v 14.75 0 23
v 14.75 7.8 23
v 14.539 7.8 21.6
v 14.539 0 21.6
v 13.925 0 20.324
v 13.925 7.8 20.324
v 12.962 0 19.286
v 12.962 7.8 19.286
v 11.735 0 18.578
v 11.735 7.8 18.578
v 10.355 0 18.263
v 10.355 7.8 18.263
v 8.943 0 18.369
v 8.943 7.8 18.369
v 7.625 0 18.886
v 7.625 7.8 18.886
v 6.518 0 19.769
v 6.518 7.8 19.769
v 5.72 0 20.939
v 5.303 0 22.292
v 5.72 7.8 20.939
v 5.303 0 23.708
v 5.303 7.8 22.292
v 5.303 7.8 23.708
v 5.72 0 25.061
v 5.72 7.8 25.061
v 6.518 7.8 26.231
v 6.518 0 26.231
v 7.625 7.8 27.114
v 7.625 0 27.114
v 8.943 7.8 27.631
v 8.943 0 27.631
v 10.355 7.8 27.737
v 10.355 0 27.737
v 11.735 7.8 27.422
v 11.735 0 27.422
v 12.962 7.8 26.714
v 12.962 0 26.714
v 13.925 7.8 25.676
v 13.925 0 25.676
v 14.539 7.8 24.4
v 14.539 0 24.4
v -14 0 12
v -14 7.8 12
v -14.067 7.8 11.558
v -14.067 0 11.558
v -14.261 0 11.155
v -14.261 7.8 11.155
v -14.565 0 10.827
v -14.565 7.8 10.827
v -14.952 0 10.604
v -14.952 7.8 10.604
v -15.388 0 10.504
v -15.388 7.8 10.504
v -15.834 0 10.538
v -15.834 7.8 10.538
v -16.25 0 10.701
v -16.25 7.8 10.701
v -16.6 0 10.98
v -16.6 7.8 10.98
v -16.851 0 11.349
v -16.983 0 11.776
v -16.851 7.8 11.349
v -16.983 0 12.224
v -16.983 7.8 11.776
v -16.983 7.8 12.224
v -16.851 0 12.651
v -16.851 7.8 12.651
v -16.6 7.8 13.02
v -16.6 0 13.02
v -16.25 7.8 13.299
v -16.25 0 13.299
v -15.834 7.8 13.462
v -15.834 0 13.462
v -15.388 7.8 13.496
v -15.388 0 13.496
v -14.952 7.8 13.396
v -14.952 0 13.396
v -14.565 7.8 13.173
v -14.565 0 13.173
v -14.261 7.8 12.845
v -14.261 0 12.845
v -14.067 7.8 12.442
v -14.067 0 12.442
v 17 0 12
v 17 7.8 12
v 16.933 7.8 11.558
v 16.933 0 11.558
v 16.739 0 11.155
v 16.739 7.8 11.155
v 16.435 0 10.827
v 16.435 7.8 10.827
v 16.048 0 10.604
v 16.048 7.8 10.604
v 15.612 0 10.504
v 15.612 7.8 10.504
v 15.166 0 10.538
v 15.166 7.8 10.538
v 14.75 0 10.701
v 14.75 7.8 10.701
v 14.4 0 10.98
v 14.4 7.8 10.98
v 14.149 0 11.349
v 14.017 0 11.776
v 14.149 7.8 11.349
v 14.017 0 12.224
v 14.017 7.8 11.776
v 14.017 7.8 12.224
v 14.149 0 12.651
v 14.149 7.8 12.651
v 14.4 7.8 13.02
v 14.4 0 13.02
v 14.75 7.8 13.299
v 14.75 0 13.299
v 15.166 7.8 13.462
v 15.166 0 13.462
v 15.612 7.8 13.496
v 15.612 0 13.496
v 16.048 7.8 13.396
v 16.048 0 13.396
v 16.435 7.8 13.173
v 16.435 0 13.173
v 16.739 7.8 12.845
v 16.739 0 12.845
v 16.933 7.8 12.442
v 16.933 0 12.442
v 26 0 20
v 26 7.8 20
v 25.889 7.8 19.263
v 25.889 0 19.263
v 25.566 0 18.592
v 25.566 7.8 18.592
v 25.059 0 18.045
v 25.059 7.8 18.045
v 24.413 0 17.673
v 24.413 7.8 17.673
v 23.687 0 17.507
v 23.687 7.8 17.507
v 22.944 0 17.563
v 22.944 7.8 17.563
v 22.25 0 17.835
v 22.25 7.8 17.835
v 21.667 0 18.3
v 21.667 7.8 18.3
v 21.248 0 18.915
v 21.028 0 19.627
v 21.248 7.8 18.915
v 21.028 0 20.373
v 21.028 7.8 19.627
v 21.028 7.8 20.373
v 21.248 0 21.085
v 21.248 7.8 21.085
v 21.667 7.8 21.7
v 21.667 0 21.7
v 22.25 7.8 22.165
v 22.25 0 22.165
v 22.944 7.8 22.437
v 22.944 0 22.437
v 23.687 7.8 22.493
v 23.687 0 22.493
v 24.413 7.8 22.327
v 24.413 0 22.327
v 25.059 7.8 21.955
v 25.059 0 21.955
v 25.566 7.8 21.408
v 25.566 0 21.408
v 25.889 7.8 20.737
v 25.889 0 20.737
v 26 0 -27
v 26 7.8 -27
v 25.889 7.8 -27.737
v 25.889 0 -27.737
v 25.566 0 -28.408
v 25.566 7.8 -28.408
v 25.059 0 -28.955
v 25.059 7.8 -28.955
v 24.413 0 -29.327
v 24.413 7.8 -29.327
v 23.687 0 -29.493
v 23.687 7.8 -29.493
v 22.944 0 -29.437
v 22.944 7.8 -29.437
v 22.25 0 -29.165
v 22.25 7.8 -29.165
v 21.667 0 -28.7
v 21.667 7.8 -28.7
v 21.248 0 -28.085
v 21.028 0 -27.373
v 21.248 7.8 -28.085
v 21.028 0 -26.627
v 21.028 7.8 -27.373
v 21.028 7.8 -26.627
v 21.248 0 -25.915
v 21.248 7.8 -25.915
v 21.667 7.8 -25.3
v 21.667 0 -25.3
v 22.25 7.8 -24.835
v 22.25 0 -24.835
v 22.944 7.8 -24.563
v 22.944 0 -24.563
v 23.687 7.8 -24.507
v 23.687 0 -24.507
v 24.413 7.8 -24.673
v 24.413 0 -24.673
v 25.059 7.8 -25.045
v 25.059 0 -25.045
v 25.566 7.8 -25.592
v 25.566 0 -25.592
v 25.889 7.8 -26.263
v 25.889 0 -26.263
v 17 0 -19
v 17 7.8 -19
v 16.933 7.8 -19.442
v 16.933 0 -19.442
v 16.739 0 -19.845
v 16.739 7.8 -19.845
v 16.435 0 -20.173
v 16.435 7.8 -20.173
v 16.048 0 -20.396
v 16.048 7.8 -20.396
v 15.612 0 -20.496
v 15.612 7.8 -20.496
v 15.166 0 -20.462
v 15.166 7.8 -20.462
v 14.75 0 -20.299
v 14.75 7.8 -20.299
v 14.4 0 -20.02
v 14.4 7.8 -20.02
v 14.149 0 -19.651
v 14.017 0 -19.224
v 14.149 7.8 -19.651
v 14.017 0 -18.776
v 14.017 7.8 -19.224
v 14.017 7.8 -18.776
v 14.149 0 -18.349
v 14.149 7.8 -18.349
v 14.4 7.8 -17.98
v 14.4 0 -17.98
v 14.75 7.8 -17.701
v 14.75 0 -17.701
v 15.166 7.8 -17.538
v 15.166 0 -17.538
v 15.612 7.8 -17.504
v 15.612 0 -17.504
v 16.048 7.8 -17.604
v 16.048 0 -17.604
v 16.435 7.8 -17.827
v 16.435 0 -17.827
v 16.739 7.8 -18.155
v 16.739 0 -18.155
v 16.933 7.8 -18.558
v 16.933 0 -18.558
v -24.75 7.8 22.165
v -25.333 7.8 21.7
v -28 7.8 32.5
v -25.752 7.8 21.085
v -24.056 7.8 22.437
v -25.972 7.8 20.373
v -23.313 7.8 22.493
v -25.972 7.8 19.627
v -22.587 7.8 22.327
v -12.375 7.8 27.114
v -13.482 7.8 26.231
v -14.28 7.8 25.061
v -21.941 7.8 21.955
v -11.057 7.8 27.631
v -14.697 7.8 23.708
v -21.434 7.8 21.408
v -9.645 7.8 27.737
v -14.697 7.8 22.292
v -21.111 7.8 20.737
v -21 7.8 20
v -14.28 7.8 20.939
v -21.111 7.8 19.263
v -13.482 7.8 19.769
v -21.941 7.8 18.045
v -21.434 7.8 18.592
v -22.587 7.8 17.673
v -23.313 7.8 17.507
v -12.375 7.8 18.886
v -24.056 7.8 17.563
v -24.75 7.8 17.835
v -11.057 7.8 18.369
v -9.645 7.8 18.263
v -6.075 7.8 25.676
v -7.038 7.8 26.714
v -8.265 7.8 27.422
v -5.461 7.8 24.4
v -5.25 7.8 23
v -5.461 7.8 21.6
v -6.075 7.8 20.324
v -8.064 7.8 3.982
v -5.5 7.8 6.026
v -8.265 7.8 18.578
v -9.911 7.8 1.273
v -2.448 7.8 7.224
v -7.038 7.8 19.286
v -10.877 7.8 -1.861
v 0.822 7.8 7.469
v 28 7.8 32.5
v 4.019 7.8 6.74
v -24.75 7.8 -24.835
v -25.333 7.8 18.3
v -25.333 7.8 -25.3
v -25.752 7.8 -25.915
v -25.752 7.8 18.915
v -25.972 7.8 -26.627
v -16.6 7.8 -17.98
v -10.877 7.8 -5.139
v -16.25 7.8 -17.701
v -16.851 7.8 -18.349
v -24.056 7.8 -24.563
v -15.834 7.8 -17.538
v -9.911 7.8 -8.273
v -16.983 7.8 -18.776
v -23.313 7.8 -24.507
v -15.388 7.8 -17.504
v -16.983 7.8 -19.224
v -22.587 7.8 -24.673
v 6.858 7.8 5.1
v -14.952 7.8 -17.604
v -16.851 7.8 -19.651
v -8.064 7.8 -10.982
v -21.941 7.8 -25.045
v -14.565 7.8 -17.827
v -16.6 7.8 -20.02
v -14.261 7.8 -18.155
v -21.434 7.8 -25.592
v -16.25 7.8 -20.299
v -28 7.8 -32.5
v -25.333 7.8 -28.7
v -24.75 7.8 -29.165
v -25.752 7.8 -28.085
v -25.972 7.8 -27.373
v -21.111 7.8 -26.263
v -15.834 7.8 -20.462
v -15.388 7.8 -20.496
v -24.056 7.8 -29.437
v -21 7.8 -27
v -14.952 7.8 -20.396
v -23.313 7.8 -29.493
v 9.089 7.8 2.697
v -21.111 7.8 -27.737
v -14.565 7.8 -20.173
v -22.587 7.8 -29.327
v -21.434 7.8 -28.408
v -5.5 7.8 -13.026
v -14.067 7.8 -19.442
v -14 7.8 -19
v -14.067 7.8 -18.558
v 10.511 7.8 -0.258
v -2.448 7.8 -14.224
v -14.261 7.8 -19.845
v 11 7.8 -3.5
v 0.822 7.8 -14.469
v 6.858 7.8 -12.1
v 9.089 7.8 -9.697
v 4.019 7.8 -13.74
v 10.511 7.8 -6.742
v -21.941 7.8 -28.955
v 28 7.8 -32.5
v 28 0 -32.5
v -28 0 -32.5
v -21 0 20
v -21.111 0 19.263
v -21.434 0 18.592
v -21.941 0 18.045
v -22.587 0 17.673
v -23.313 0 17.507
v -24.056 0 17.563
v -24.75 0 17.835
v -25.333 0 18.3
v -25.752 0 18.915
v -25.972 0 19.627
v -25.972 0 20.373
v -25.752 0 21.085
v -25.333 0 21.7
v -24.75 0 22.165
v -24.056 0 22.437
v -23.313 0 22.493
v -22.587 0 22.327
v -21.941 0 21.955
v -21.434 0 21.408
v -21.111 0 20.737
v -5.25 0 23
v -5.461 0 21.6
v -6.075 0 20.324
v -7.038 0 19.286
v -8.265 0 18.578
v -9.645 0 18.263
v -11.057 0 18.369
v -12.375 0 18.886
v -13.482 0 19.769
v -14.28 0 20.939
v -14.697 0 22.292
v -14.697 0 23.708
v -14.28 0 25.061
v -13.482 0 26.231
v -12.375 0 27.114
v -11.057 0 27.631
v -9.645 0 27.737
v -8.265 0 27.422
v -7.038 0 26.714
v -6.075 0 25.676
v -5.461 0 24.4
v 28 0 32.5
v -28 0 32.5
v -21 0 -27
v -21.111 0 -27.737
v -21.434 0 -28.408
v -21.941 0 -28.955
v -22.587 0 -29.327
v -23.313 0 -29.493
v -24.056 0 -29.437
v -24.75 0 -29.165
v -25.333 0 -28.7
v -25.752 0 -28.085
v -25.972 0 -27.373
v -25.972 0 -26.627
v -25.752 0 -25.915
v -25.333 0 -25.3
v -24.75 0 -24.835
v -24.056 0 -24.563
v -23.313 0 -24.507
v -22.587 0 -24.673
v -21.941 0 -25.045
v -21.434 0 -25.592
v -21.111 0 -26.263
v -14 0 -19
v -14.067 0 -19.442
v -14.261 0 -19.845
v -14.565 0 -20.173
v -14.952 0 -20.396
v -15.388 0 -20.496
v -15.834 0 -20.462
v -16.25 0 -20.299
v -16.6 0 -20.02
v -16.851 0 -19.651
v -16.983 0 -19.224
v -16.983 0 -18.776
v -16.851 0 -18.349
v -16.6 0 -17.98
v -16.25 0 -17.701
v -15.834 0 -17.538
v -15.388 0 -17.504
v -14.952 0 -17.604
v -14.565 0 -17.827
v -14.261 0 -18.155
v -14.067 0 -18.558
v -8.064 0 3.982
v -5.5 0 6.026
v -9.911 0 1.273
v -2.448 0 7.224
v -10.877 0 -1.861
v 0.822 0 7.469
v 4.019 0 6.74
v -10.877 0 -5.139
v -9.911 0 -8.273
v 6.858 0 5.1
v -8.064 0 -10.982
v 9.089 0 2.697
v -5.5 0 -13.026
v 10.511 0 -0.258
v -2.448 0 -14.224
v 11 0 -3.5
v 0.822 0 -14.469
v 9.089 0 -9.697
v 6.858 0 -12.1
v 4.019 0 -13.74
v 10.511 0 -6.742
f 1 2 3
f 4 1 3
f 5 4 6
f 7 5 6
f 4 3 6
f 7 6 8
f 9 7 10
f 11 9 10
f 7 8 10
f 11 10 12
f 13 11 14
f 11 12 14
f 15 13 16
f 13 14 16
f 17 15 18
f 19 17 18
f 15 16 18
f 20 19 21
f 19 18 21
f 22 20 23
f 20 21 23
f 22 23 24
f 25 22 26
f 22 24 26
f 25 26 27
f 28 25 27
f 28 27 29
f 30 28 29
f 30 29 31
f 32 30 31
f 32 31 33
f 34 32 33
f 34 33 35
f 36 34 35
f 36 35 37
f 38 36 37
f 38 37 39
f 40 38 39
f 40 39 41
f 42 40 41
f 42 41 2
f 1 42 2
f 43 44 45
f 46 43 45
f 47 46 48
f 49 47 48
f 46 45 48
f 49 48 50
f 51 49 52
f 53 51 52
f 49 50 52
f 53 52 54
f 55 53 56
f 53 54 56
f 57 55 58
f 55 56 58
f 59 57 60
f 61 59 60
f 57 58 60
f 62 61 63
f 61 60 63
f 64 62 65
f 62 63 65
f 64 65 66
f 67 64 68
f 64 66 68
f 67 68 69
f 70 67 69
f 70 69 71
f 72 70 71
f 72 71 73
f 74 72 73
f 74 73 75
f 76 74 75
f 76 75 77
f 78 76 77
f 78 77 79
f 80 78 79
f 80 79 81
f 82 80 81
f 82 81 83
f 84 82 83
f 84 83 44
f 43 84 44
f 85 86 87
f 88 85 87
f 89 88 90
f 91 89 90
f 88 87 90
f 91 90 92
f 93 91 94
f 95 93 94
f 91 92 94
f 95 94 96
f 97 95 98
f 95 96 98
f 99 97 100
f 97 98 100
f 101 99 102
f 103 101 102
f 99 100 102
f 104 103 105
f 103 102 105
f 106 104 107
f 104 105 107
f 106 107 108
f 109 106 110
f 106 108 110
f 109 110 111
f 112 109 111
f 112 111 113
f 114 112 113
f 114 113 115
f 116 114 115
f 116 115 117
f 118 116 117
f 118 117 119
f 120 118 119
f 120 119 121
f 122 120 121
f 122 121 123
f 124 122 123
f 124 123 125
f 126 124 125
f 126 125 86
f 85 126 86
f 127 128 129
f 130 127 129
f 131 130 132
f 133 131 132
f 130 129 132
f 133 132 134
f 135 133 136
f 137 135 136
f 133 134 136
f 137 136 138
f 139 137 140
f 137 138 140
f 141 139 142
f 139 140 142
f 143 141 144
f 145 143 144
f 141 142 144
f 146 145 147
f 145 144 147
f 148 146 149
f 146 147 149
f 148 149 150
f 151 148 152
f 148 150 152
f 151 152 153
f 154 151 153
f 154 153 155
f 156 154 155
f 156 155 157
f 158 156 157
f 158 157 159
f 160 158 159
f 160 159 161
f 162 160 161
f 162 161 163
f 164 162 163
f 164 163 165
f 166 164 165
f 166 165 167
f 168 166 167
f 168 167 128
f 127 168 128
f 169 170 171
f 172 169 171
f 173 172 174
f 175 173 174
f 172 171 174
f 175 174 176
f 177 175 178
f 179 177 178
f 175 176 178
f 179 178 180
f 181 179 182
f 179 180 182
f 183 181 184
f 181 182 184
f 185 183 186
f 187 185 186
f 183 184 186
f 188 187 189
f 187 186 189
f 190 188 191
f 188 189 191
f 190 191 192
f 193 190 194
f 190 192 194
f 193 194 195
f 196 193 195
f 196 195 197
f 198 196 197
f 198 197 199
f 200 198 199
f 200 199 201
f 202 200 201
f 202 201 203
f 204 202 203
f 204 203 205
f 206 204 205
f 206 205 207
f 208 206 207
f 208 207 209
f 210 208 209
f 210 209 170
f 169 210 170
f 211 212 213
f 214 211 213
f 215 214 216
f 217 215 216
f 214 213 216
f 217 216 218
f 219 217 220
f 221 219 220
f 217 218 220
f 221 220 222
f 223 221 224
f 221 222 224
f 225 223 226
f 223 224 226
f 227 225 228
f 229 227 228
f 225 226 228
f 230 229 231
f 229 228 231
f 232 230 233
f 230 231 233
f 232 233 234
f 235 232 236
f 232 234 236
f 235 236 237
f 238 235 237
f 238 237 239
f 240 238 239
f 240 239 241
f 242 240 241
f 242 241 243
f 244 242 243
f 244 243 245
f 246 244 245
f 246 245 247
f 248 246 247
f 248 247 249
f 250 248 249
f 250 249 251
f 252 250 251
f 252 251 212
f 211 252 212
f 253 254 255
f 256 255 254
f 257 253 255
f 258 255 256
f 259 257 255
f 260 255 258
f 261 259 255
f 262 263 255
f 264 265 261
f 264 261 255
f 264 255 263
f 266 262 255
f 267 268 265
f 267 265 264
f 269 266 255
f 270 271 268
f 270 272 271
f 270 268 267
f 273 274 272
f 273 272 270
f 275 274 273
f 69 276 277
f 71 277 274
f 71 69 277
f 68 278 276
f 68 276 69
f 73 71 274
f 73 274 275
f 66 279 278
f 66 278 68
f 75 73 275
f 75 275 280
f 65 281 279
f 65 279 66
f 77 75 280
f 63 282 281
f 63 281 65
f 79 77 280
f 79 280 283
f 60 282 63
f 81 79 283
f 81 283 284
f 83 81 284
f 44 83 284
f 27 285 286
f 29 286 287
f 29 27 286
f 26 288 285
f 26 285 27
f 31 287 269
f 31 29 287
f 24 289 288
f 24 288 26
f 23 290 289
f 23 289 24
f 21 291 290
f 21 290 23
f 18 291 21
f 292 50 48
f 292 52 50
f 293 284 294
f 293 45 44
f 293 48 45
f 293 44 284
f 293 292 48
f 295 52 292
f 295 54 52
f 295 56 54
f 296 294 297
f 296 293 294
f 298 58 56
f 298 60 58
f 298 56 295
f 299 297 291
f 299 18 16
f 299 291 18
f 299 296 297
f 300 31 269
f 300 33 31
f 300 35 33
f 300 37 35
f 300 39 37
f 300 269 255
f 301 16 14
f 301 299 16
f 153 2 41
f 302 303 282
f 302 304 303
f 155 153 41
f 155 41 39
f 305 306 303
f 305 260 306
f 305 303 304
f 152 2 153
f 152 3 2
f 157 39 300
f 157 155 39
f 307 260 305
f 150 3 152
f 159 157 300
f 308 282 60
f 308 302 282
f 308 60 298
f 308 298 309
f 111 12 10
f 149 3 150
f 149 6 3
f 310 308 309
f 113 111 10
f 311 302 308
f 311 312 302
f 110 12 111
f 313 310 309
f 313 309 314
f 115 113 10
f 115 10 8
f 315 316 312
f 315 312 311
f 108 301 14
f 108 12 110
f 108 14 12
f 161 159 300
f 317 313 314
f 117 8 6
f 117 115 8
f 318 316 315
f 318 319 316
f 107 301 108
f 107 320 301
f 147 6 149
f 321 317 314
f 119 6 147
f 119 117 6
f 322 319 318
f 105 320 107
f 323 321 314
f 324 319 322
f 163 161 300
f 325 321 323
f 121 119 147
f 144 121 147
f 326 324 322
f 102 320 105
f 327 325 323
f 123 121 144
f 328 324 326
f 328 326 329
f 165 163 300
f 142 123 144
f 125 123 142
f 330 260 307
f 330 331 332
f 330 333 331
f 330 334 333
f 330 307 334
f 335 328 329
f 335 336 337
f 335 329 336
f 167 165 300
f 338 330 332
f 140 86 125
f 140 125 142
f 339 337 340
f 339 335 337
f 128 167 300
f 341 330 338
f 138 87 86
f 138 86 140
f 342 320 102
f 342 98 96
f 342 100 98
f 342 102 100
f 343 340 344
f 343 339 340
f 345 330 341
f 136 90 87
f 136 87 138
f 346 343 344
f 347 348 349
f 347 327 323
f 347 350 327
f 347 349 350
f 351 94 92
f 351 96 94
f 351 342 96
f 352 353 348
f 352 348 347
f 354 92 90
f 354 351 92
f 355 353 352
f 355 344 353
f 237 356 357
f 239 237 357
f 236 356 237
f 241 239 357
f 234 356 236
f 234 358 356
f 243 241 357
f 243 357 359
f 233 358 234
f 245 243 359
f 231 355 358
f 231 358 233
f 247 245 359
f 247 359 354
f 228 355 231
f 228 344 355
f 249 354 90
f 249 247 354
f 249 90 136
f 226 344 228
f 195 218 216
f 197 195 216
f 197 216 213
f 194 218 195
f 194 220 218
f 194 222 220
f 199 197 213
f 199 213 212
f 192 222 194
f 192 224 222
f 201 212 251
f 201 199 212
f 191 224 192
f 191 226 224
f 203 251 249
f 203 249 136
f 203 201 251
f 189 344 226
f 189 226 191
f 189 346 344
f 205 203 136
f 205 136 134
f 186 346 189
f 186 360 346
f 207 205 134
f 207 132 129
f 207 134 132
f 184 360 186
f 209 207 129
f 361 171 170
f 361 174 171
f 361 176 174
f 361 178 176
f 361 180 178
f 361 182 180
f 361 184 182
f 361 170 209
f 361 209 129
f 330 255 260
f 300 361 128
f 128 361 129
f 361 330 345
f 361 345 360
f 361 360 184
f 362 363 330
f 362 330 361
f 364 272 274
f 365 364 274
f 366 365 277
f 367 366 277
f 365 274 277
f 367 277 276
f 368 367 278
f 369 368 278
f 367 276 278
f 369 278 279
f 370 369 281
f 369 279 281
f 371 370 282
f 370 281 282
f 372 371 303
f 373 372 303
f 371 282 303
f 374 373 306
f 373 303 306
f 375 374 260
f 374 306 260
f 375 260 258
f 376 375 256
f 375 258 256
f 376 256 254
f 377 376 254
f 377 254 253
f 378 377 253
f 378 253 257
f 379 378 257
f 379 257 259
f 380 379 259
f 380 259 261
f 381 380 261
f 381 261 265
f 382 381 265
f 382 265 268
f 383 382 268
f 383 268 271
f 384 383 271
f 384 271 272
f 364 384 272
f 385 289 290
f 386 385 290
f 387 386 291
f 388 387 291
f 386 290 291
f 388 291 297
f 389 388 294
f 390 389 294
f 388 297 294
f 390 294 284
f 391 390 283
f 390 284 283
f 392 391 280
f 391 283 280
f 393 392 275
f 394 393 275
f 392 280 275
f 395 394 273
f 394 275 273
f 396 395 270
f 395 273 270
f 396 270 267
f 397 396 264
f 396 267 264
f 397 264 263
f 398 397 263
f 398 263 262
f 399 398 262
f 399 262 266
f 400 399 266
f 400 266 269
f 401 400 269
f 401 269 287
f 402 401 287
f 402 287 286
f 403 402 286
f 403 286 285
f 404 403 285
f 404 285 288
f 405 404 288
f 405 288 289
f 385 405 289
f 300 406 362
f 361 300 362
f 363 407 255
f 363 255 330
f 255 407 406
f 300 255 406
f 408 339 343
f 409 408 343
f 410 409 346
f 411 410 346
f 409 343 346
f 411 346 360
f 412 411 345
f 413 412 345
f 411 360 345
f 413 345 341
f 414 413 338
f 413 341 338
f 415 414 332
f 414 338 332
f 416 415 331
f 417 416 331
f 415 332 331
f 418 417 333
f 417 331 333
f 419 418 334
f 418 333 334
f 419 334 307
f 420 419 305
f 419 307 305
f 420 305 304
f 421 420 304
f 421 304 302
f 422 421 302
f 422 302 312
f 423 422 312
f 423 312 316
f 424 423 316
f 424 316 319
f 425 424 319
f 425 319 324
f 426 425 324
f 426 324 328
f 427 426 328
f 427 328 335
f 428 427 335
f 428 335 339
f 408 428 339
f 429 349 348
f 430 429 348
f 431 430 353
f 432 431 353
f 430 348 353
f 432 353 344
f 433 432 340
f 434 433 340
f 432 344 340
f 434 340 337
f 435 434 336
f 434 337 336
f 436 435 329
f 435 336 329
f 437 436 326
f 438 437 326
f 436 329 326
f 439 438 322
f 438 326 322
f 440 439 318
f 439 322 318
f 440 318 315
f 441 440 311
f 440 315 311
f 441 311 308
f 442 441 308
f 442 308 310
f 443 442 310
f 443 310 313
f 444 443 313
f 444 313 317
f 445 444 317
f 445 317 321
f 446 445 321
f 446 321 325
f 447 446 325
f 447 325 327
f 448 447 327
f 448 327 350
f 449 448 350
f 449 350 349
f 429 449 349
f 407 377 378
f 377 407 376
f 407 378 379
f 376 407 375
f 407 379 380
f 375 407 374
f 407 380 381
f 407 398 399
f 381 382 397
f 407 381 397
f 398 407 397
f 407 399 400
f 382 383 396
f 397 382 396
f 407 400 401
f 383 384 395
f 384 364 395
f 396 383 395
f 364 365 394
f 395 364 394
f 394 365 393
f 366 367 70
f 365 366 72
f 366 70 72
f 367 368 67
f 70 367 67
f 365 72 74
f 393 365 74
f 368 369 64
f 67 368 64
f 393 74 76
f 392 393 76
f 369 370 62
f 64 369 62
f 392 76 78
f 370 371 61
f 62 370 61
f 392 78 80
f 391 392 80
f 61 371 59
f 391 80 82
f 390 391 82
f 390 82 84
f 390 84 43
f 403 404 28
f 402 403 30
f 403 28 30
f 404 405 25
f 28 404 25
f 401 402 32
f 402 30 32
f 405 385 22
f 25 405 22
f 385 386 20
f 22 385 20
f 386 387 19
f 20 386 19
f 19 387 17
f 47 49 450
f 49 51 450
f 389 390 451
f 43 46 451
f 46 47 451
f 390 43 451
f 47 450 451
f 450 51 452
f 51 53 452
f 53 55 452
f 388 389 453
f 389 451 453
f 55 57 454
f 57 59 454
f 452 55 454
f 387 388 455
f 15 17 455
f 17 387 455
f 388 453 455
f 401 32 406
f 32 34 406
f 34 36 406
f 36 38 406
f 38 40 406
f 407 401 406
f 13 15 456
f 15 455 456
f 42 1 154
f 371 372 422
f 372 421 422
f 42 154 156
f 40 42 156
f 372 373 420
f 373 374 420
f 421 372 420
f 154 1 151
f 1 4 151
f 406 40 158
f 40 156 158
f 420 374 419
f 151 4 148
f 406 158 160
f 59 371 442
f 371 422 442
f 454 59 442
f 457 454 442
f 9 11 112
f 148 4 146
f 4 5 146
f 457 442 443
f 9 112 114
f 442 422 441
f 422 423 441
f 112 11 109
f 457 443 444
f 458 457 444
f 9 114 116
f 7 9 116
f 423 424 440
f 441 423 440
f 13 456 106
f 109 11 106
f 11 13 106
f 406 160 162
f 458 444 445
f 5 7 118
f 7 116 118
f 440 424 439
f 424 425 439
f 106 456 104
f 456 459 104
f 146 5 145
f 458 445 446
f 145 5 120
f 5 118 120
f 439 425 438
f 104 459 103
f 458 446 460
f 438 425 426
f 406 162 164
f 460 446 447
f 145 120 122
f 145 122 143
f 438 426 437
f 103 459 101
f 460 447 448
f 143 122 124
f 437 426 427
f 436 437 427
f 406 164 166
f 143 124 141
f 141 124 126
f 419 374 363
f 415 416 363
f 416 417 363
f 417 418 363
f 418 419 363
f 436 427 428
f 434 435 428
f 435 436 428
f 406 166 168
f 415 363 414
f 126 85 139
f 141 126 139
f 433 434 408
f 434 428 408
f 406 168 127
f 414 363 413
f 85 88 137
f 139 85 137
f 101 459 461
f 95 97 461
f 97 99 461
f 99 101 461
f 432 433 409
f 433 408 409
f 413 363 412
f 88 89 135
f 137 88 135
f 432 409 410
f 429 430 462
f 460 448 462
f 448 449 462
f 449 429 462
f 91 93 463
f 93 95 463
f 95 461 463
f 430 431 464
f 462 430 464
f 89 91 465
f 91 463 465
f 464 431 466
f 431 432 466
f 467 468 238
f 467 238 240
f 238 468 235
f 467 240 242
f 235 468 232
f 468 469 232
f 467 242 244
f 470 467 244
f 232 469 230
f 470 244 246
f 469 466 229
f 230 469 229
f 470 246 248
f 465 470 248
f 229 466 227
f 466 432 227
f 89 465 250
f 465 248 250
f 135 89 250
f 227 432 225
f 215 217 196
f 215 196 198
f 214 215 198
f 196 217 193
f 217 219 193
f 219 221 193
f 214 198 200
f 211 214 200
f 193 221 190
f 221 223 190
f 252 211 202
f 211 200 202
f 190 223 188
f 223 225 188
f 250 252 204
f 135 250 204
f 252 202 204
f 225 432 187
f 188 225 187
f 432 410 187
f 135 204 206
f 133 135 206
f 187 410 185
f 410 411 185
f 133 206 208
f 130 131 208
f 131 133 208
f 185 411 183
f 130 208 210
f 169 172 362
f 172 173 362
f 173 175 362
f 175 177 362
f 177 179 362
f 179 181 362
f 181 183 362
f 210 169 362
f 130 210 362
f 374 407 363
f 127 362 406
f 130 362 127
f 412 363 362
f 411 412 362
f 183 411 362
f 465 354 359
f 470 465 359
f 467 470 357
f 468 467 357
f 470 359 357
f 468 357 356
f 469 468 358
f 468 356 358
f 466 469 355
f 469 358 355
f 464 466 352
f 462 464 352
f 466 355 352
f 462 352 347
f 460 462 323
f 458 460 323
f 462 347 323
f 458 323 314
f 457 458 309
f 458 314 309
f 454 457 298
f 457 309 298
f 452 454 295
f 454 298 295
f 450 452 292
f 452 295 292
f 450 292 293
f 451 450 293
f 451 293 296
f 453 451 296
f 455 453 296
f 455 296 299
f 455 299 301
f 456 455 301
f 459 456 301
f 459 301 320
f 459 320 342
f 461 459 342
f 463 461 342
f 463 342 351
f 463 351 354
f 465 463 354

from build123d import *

# Parameters (mm, degrees)
SKETCH_1_W          = 56
SKETCH_1_H          = 65
EXTRUDE_1_DEPTH     = 7.8
SKETCH_3_R          = 4.75
CUT_EXTRUDE_2_DEPTH = 8.8
SKETCH_4_R          = 11
SKETCH_4_R_2        = 1.5
SKETCH_4_R_3        = 2.5
CUT_EXTRUDE_3_DEPTH = 8.8


with BuildPart() as part:
    # 草图1 → 凸台-拉伸1 (new body)
    with BuildSketch(Plane(origin=(0, 0, 0), x_dir=(1, 0, 0), z_dir=(0, 1, 0))):
        Rectangle(SKETCH_1_W, SKETCH_1_H)
    extrude(amount=EXTRUDE_1_DEPTH)

    # 草图3 → 切除-拉伸2 (cut, through all)
    with BuildSketch(Plane(origin=(0, 7.8, 0), x_dir=(1, 0, 0), z_dir=(0, 1, 0))):
        with Locations((-10, -23)):
            Circle(SKETCH_3_R)
        with Locations((10, -23)):
            Circle(SKETCH_3_R)
    extrude(amount=-CUT_EXTRUDE_2_DEPTH, mode=Mode.SUBTRACT)

    # 草图4 → 切除-拉伸3 (cut, through all)
    with BuildSketch(Plane(origin=(0, 7.8, 0), x_dir=(1, 0, 0), z_dir=(0, 1, 0))):
        with Locations((0, 3.5)):
            Circle(SKETCH_4_R)
        with Locations((-15.5, 19)):
            Circle(SKETCH_4_R_2)
        with Locations((15.5, 19)):
            Circle(SKETCH_4_R_2)
        with Locations((15.5, -12)):
            Circle(SKETCH_4_R_2)
        with Locations((-15.5, -12)):
            Circle(SKETCH_4_R_2)
        with Locations((-23.5, 27)):
            Circle(SKETCH_4_R_3)
        with Locations((23.5, 27)):
            Circle(SKETCH_4_R_3)
        with Locations((23.5, -20)):
            Circle(SKETCH_4_R_3)
        with Locations((-23.5, -20)):
            Circle(SKETCH_4_R_3)
    extrude(amount=-CUT_EXTRUDE_3_DEPTH, mode=Mode.SUBTRACT)


solid = part.part
